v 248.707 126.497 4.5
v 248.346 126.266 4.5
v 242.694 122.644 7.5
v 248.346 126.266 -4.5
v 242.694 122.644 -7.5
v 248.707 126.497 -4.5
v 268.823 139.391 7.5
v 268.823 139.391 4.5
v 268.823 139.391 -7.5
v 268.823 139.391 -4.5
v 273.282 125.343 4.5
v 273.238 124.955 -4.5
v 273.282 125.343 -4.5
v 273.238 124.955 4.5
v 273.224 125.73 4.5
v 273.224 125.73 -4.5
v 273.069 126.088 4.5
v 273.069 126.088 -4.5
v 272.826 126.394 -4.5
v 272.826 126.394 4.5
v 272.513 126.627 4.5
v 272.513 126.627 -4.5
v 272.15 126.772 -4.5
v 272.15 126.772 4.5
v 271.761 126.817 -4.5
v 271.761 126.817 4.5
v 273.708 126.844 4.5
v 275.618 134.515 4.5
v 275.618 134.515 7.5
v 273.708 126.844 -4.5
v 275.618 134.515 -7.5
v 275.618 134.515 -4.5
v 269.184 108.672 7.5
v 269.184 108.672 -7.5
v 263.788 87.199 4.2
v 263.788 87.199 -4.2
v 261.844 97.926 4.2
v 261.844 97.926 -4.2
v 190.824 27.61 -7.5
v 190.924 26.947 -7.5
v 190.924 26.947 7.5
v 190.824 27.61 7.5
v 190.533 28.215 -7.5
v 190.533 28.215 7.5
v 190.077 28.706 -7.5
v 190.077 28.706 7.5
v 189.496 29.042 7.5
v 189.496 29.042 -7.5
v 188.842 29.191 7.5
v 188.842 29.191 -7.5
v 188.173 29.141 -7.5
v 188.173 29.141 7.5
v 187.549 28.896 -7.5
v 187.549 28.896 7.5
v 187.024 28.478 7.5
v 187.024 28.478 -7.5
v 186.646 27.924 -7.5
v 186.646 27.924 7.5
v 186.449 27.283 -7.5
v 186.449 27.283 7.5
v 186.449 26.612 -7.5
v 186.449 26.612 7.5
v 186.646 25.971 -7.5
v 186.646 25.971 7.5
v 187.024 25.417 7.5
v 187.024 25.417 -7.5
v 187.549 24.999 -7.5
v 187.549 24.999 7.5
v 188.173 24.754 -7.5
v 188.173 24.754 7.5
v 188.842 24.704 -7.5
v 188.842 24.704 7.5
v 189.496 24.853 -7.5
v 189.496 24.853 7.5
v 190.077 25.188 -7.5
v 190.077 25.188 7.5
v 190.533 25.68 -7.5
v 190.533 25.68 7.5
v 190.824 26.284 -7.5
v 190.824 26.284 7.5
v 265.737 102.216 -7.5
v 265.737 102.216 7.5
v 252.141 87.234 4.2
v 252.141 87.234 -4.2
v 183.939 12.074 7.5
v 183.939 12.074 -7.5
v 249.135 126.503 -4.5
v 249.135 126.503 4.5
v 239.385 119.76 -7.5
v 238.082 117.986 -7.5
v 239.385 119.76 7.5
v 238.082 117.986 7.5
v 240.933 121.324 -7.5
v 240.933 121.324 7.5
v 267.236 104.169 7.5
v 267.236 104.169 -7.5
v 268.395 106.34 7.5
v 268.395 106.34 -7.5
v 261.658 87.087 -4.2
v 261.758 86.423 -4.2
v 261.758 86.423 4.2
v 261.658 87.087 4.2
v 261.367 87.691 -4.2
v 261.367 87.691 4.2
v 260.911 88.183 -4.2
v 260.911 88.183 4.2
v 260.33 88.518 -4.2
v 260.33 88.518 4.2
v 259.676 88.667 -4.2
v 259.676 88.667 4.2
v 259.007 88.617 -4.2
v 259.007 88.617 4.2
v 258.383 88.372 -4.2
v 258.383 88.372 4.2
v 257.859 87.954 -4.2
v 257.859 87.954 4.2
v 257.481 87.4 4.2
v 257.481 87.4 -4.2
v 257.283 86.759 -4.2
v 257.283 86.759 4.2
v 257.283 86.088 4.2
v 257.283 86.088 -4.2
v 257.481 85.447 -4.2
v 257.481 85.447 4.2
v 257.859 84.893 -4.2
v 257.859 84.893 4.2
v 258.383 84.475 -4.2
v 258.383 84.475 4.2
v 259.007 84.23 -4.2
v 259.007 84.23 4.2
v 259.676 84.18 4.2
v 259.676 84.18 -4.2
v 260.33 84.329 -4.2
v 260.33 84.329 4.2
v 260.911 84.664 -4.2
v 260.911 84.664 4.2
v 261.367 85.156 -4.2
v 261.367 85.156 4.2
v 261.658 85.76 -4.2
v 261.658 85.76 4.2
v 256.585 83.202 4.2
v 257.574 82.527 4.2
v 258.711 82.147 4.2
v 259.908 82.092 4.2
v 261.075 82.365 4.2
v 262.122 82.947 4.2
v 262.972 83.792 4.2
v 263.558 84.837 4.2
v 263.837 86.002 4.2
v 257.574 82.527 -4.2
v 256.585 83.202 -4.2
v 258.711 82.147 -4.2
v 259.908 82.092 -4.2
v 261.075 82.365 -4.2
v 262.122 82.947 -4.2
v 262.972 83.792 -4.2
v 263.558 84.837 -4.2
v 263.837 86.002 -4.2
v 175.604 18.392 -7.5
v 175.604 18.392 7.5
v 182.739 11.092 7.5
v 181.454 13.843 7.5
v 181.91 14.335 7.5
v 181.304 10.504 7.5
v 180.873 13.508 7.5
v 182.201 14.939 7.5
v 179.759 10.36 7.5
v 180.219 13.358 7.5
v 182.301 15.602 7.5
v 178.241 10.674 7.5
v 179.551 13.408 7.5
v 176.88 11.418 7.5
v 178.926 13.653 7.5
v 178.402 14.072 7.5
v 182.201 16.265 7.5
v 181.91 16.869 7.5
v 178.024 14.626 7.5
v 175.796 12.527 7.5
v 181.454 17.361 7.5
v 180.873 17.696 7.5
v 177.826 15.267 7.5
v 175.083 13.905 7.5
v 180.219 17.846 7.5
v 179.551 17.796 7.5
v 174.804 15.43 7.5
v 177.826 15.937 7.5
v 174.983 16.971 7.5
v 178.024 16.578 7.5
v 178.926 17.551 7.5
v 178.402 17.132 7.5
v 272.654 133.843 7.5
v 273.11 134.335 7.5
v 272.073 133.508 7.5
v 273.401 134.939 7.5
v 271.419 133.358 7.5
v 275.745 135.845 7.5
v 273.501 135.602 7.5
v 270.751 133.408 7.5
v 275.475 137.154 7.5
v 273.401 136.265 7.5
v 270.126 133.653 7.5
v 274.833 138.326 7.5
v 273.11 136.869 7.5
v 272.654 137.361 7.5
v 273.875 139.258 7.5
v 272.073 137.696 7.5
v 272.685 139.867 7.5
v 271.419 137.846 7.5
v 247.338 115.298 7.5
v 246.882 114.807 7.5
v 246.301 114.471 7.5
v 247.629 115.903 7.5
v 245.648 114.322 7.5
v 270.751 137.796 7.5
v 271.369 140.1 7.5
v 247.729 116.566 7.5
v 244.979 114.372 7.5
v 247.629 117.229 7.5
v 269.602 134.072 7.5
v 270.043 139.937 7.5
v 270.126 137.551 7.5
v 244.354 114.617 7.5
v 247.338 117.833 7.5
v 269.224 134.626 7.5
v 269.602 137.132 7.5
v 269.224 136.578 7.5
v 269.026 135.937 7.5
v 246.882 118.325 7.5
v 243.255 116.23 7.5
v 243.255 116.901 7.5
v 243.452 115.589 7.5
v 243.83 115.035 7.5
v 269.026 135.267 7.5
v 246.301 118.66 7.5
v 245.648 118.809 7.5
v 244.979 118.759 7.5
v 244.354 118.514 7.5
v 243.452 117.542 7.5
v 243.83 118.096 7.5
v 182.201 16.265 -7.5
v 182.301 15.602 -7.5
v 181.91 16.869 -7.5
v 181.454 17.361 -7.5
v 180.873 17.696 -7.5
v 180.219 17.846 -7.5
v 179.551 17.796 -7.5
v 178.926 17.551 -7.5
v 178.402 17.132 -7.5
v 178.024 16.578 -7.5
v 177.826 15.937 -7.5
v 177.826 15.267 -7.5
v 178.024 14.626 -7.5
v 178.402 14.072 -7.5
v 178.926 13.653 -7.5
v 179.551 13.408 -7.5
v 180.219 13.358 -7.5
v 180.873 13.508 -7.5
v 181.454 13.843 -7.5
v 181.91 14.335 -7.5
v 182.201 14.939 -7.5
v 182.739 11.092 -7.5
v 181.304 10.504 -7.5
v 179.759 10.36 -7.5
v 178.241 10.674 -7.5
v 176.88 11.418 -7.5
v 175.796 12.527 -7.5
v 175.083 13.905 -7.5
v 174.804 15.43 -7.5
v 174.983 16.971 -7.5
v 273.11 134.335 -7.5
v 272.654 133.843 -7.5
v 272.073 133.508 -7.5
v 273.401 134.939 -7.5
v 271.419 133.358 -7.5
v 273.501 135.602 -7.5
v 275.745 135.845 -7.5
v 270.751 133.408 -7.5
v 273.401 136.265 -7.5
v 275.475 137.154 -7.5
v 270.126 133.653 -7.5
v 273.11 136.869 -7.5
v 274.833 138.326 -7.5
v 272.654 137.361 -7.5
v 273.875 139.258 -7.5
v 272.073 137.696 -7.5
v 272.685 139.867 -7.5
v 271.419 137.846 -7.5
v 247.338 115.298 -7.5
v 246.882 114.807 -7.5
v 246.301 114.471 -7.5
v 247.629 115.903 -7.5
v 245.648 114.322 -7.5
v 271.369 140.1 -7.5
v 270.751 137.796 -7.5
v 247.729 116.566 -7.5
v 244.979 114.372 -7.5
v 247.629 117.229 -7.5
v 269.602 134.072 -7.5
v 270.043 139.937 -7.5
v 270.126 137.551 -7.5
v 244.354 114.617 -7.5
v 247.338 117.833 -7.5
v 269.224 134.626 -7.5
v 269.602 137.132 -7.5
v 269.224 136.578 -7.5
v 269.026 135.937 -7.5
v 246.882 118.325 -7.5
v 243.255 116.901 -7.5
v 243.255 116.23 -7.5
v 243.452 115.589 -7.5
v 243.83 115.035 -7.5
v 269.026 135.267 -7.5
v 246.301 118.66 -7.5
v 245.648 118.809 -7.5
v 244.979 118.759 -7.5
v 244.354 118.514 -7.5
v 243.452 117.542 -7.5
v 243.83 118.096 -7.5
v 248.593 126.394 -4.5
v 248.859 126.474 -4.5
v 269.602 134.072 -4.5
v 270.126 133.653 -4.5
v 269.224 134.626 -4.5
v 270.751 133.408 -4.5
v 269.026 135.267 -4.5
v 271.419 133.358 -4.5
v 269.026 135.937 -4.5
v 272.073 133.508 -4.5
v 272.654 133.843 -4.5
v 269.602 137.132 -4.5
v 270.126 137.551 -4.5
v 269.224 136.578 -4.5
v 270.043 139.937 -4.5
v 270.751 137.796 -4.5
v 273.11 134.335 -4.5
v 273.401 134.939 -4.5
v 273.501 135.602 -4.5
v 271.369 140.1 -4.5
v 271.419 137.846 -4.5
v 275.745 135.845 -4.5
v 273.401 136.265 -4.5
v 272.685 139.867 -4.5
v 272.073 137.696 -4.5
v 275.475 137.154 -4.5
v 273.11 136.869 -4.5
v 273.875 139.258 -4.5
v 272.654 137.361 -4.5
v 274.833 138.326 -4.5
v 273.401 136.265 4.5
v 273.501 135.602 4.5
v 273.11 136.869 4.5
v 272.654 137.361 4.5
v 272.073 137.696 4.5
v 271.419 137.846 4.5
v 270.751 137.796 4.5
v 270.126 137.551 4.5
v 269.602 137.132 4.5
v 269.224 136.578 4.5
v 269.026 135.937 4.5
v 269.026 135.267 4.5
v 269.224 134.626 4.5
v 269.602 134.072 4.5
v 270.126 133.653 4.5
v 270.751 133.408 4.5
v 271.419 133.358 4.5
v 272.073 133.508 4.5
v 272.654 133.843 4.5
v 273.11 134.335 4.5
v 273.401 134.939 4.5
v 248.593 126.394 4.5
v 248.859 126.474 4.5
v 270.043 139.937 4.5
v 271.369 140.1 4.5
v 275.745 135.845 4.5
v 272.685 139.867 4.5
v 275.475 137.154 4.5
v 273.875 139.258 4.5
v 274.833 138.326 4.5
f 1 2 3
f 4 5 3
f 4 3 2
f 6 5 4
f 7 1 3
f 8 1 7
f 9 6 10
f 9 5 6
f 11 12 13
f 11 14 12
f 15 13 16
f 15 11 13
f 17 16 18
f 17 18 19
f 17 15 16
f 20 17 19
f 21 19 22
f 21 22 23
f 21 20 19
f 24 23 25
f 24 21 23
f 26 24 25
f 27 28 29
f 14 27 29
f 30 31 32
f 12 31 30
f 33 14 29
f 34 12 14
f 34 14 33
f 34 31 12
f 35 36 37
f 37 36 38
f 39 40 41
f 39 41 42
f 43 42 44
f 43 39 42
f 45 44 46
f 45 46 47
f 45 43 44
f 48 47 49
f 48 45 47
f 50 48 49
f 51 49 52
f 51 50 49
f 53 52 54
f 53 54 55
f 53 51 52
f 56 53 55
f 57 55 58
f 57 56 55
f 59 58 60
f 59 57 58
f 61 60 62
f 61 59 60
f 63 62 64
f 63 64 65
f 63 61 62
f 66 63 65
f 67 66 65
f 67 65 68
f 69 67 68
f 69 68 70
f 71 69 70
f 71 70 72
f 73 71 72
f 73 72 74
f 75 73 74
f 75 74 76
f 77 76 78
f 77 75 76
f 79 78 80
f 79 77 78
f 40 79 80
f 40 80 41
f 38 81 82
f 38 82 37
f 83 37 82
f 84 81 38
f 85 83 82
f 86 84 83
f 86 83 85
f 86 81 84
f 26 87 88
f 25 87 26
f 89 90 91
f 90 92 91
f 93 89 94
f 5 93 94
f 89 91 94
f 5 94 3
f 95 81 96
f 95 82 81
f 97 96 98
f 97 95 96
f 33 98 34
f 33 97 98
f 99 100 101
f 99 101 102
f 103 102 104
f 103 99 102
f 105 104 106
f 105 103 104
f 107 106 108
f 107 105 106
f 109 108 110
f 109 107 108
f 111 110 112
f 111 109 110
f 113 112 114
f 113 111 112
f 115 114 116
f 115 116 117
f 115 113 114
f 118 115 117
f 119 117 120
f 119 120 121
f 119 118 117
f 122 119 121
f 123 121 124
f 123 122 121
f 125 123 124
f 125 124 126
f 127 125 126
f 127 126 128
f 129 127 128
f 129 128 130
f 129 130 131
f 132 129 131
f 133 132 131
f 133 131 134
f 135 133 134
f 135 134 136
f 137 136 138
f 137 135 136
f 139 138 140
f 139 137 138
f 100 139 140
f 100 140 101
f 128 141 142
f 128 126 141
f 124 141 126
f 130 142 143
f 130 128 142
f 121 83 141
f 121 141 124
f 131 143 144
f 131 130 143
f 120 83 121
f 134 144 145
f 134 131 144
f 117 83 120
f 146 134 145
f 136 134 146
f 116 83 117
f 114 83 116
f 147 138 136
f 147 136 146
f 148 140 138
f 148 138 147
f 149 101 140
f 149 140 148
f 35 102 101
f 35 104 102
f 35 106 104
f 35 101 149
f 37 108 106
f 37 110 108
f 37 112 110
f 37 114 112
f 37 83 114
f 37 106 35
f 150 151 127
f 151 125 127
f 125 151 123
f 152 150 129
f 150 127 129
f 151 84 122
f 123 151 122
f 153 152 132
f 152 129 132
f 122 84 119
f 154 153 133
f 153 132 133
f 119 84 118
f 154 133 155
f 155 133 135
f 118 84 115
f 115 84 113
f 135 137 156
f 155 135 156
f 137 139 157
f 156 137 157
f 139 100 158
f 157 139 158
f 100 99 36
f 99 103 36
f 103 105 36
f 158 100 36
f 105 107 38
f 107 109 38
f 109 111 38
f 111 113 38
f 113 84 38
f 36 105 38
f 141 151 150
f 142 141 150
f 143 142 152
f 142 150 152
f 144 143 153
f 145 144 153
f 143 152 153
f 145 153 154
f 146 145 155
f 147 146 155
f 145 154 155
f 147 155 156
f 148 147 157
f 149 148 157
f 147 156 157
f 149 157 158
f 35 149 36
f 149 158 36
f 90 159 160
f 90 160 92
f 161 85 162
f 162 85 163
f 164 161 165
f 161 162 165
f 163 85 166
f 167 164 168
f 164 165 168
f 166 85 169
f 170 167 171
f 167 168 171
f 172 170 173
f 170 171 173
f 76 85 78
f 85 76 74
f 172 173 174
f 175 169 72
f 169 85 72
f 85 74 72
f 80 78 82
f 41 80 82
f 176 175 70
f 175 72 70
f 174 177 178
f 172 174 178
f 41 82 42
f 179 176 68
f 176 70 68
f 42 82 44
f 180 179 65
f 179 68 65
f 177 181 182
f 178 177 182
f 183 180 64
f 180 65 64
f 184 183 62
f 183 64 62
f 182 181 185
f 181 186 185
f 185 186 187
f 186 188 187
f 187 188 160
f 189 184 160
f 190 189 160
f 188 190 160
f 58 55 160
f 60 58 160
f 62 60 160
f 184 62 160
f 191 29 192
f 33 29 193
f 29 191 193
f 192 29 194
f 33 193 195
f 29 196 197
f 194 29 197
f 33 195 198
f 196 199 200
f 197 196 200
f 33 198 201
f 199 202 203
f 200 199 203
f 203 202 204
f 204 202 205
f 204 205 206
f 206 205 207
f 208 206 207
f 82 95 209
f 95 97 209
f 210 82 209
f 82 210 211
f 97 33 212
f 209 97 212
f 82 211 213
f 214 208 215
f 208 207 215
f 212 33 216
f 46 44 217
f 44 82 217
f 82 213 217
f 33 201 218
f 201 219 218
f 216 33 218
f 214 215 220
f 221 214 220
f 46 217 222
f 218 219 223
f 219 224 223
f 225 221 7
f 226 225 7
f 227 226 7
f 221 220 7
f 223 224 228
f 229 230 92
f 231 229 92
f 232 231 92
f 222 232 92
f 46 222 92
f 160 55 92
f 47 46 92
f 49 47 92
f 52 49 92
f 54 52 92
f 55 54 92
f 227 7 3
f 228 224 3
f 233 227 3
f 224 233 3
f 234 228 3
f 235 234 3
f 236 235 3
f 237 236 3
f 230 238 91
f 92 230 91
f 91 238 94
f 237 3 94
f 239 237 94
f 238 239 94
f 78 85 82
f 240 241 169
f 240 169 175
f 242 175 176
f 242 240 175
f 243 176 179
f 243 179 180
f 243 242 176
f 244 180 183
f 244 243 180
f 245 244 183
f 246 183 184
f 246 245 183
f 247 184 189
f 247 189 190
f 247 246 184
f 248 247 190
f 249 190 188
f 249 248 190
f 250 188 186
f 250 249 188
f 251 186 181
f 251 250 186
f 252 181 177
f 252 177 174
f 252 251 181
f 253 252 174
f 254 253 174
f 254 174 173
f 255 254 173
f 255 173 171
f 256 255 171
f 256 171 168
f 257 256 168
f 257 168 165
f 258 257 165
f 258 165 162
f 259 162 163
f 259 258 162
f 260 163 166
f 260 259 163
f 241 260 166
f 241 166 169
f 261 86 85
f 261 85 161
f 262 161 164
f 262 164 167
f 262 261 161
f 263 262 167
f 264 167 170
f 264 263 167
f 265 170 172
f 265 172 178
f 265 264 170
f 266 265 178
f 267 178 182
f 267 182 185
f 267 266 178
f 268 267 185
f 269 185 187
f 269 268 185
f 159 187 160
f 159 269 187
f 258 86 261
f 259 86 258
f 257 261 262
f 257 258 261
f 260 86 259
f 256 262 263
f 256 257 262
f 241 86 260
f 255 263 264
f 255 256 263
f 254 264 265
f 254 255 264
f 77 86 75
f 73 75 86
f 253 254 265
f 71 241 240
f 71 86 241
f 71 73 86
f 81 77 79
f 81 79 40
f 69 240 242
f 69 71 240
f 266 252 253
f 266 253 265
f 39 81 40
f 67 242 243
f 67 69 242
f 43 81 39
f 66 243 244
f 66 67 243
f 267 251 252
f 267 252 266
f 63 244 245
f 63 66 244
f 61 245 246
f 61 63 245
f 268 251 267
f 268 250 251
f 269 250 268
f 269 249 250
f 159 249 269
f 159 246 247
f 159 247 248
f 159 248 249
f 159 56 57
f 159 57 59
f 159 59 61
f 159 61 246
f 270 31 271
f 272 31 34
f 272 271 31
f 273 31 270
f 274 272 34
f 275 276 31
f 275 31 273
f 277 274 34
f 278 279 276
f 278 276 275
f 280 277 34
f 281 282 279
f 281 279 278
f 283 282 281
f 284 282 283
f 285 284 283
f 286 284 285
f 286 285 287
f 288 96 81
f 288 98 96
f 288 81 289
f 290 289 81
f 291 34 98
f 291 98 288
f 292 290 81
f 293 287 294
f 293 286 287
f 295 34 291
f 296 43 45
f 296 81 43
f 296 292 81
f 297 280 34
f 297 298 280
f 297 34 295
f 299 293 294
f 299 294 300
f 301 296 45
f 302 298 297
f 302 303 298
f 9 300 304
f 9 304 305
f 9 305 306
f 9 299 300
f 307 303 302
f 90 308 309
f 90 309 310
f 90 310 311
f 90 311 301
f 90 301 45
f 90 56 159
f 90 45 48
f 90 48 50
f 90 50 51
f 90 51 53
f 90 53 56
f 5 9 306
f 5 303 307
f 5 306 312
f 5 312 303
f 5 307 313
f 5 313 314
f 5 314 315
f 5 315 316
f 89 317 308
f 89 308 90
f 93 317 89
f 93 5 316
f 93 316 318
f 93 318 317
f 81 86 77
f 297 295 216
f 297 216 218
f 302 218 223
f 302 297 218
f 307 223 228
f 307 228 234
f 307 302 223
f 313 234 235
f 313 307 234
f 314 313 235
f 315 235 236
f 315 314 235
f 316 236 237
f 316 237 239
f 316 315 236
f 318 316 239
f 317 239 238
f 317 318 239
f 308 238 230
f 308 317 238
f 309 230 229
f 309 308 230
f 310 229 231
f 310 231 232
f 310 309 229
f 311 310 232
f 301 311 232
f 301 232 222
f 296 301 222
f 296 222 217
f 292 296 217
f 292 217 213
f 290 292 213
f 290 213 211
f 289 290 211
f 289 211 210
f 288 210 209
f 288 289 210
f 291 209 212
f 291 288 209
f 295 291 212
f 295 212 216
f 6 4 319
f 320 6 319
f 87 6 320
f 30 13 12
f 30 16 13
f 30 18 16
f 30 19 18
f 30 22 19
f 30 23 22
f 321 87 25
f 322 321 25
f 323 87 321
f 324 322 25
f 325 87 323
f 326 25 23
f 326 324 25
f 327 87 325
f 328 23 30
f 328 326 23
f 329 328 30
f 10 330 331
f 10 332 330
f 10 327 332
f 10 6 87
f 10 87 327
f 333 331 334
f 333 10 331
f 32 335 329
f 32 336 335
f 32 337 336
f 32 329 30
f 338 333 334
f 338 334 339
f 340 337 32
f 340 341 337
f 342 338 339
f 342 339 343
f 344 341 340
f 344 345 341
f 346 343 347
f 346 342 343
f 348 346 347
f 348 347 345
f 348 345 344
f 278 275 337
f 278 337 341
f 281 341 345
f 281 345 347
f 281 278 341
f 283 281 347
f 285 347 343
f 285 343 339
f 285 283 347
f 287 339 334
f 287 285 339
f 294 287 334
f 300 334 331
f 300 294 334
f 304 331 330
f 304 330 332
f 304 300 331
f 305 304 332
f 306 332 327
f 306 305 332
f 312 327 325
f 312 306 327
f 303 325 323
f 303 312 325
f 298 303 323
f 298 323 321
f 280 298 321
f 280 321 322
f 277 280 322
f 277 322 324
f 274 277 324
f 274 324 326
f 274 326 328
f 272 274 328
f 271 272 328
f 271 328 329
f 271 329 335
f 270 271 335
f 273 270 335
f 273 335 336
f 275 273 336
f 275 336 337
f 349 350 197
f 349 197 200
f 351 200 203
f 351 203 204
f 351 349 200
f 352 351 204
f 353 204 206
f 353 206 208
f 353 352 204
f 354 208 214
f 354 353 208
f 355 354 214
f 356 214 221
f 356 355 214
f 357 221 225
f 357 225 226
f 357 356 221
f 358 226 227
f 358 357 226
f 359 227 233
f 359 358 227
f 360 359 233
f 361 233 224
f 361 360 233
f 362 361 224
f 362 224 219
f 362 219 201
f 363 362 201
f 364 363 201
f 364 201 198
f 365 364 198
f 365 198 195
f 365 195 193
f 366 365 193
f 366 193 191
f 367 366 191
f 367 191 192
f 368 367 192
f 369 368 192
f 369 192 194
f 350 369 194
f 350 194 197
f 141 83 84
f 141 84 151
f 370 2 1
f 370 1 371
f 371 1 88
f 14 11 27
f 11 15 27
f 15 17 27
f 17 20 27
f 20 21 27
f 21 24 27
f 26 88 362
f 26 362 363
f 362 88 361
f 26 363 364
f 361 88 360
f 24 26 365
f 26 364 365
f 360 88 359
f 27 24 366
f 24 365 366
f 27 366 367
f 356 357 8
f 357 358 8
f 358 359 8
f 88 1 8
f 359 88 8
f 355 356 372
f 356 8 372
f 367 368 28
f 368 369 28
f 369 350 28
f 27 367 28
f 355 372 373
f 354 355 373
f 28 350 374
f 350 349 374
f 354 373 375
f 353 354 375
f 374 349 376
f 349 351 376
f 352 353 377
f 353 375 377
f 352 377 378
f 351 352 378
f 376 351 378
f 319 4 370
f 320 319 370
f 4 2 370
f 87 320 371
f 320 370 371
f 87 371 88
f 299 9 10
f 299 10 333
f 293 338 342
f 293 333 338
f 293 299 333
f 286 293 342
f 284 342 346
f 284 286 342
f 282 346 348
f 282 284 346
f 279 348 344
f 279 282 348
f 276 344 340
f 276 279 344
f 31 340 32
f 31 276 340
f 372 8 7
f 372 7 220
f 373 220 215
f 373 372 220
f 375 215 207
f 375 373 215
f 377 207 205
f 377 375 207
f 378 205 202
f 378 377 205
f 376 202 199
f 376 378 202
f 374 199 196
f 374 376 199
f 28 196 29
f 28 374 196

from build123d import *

# Parameters (mm, degrees)
EXTRUDE_1_DEPTH          = 5
EXTRUDE_1_DEPTH_BACK     = 5
SKETCH_1_R               = 1.5
CUT_EXTRUDE_1_DEPTH      = 3
CUT_EXTRUDE_1_DEPTH_BACK = 3
SKETCH_2_R               = 1.5
EXTRUDE_4_DEPTH          = 2.8
EXTRUDE_4_DEPTH_BACK     = 2.8
SKETCH_3_R               = 1.5
FILLET_1_R               = 10
FILLET_2_R               = 1
SCALE1_SCALE             = 1.5


with BuildPart() as part:
    # 草图1 → 凸台-拉伸1 (new, two sides: drawn at the far end of the back side and taken through both)
    with BuildSketch(Plane.XY.offset(-EXTRUDE_1_DEPTH_BACK)):
        with BuildLine():
            Line((255.314096956, 96.605744176), (199.091935004, 34.648006604))
            ThreePointArc((199.091935004, 34.648006604), (194.385791324, 34.210713053), (193.535103741, 38.859943595))
            Line((193.535103741, 38.859943595), (236.376857538, 107.153065983))
            Line((236.376857538, 107.153065983), (255.681175992, 119.525749162))
            ThreePointArc((255.681175992, 119.525749162), (259.048997407, 119.43741832), (260.211134207, 116.275225808))
            Line((260.211134207, 116.275225808), (255.314096956, 96.605744176))
        make_face()
        with Locations((196.5, 37)):
            Circle(SKETCH_1_R, mode=Mode.SUBTRACT)
        with Locations((202.248291042, 44.563540844)):
            Circle(SKETCH_1_R, mode=Mode.SUBTRACT)
        with Locations((257.3, 117)):
            Circle(SKETCH_1_R, mode=Mode.SUBTRACT)
        with Locations((240.118819851, 104.309174626)):
            Circle(SKETCH_1_R, mode=Mode.SUBTRACT)
    extrude(amount=EXTRUDE_1_DEPTH + EXTRUDE_1_DEPTH_BACK)

    # 草图2 → 切除-拉伸1 (cut, two sides: drawn at the far end of the back side and taken through both)
    with BuildSketch(Plane.XY.offset(-CUT_EXTRUDE_1_DEPTH_BACK)):
        with BuildLine():
            Line((255.681175992, 119.525749162), (242.27027225, 110.930322002))
            Line((242.27027225, 110.930322002), (258.937967915, 111.161415211))
            Line((258.937967915, 111.161415211), (260.211134207, 116.275225808))
            ThreePointArc((260.211134207, 116.275225808), (259.048997407, 119.43741832), (255.681175992, 119.525749162))
        make_face()
        with Locations((257.3, 117)):
            Circle(SKETCH_2_R, mode=Mode.SUBTRACT)
    extrude(amount=CUT_EXTRUDE_1_DEPTH + CUT_EXTRUDE_1_DEPTH_BACK, mode=Mode.SUBTRACT)

    # 草图3 → 凸台-拉伸4 (add, two sides: drawn at the far end of the back side and taken through both)
    with BuildSketch(Plane.XY.offset(-EXTRUDE_4_DEPTH_BACK)):
        with BuildLine():
            Line((244.560105761, 84.754670841), (247.522317194, 82.066678389))
            ThreePointArc((247.522317194, 82.066678389), (250.878196788, 81.678515203), (252.324623716, 84.731456021))
            Line((252.324623716, 84.731456021), (251.028481638, 91.882926341))
            Line((251.028481638, 91.882926341), (244.560105761, 84.754670841))
        make_face()
        with Locations((249.471111722, 84.214281678)):
            Circle(SKETCH_3_R, mode=Mode.SUBTRACT)
    extrude(amount=EXTRUDE_4_DEPTH + EXTRUDE_4_DEPTH_BACK)

    # 圆角1
    fillet_1_edges = [part.edges().sort_by_distance(p)[0] for p in [
        (236.376857538, 107.153065983, 0),
        (255.314096956, 96.605744176, 0),
    ]]
    fillet(fillet_1_edges, radius=FILLET_1_R)

    # 圆角2
    fillet_2_edges = [part.edges().sort_by_distance(p)[0] for p in [
        (258.937967915, 111.161415211, 0),
        (242.27027225, 110.930322002, 0),
    ]]
    fillet(fillet_2_edges, radius=FILLET_2_R)


with BuildPart() as part_1:
    # Scale1: scaled about (229.397572443, 79.796058166, 0)
    add(part.part.scale(SCALE1_SCALE).moved(Location((-114.698786222, -39.898029083, 0))))


solid = part_1.part
